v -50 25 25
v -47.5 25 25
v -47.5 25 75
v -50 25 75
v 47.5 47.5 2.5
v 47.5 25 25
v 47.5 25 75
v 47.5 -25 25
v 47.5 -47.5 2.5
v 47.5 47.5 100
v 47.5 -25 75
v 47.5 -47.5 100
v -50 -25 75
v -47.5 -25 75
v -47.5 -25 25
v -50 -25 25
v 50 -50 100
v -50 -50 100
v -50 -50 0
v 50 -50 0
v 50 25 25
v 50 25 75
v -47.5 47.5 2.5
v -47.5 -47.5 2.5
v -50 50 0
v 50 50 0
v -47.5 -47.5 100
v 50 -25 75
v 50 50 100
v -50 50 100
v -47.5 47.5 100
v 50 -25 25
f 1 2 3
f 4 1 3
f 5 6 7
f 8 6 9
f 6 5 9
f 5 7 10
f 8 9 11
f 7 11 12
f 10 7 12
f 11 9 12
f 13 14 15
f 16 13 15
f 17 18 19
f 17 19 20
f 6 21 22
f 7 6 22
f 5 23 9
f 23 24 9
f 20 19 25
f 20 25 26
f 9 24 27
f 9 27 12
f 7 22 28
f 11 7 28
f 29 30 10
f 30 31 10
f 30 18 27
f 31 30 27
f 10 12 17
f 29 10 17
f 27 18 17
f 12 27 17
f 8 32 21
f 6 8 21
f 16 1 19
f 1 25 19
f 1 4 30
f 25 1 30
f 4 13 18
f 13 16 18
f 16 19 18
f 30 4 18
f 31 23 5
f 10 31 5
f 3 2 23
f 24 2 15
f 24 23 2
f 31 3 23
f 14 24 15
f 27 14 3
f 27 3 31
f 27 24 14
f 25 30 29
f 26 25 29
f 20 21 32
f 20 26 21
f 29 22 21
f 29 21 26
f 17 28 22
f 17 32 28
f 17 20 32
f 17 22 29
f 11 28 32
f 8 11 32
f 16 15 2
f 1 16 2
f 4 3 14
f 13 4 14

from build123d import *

# Parameters (mm, degrees)
F0_W     = 100
F0_H     = 100
F2_DEPTH = 50
F3_DEPTH = 50
F4_T     = -2.5
F8_DEPTH = 100.001


# Not quite as in the source:
# - a feature names something its author has since deleted; it is built from what else it names


with BuildPart() as f2:
    # F0 (on Front) → F2 (new body)
    with BuildSketch(Plane.XZ):
        with Locations((0, 50)):
            Rectangle(F0_W, F0_H)
    extrude(amount=F2_DEPTH)

    # F3 (add): a face of the model
    f3_faces = [f2.faces().sort_by_distance(p)[0] for p in [
        (0, 0, 50),
    ]]
    extrude(f3_faces, amount=F3_DEPTH)

    # F4
    f4_openings = [f2.faces().sort_by_distance(p)[0] for p in [
        (0, 0, 100),
    ]]
    offset(amount=F4_T, openings=f4_openings)

    # F7 (on offset) → F8 (cut, through all)
    with BuildSketch(Plane.YZ.offset(50)):
        Polygon((25, 75), (-25, 75), (-25, 25), (0, 25), (25, 25), align=None)
    extrude(amount=-F8_DEPTH, mode=Mode.SUBTRACT)


solid = f2.part
